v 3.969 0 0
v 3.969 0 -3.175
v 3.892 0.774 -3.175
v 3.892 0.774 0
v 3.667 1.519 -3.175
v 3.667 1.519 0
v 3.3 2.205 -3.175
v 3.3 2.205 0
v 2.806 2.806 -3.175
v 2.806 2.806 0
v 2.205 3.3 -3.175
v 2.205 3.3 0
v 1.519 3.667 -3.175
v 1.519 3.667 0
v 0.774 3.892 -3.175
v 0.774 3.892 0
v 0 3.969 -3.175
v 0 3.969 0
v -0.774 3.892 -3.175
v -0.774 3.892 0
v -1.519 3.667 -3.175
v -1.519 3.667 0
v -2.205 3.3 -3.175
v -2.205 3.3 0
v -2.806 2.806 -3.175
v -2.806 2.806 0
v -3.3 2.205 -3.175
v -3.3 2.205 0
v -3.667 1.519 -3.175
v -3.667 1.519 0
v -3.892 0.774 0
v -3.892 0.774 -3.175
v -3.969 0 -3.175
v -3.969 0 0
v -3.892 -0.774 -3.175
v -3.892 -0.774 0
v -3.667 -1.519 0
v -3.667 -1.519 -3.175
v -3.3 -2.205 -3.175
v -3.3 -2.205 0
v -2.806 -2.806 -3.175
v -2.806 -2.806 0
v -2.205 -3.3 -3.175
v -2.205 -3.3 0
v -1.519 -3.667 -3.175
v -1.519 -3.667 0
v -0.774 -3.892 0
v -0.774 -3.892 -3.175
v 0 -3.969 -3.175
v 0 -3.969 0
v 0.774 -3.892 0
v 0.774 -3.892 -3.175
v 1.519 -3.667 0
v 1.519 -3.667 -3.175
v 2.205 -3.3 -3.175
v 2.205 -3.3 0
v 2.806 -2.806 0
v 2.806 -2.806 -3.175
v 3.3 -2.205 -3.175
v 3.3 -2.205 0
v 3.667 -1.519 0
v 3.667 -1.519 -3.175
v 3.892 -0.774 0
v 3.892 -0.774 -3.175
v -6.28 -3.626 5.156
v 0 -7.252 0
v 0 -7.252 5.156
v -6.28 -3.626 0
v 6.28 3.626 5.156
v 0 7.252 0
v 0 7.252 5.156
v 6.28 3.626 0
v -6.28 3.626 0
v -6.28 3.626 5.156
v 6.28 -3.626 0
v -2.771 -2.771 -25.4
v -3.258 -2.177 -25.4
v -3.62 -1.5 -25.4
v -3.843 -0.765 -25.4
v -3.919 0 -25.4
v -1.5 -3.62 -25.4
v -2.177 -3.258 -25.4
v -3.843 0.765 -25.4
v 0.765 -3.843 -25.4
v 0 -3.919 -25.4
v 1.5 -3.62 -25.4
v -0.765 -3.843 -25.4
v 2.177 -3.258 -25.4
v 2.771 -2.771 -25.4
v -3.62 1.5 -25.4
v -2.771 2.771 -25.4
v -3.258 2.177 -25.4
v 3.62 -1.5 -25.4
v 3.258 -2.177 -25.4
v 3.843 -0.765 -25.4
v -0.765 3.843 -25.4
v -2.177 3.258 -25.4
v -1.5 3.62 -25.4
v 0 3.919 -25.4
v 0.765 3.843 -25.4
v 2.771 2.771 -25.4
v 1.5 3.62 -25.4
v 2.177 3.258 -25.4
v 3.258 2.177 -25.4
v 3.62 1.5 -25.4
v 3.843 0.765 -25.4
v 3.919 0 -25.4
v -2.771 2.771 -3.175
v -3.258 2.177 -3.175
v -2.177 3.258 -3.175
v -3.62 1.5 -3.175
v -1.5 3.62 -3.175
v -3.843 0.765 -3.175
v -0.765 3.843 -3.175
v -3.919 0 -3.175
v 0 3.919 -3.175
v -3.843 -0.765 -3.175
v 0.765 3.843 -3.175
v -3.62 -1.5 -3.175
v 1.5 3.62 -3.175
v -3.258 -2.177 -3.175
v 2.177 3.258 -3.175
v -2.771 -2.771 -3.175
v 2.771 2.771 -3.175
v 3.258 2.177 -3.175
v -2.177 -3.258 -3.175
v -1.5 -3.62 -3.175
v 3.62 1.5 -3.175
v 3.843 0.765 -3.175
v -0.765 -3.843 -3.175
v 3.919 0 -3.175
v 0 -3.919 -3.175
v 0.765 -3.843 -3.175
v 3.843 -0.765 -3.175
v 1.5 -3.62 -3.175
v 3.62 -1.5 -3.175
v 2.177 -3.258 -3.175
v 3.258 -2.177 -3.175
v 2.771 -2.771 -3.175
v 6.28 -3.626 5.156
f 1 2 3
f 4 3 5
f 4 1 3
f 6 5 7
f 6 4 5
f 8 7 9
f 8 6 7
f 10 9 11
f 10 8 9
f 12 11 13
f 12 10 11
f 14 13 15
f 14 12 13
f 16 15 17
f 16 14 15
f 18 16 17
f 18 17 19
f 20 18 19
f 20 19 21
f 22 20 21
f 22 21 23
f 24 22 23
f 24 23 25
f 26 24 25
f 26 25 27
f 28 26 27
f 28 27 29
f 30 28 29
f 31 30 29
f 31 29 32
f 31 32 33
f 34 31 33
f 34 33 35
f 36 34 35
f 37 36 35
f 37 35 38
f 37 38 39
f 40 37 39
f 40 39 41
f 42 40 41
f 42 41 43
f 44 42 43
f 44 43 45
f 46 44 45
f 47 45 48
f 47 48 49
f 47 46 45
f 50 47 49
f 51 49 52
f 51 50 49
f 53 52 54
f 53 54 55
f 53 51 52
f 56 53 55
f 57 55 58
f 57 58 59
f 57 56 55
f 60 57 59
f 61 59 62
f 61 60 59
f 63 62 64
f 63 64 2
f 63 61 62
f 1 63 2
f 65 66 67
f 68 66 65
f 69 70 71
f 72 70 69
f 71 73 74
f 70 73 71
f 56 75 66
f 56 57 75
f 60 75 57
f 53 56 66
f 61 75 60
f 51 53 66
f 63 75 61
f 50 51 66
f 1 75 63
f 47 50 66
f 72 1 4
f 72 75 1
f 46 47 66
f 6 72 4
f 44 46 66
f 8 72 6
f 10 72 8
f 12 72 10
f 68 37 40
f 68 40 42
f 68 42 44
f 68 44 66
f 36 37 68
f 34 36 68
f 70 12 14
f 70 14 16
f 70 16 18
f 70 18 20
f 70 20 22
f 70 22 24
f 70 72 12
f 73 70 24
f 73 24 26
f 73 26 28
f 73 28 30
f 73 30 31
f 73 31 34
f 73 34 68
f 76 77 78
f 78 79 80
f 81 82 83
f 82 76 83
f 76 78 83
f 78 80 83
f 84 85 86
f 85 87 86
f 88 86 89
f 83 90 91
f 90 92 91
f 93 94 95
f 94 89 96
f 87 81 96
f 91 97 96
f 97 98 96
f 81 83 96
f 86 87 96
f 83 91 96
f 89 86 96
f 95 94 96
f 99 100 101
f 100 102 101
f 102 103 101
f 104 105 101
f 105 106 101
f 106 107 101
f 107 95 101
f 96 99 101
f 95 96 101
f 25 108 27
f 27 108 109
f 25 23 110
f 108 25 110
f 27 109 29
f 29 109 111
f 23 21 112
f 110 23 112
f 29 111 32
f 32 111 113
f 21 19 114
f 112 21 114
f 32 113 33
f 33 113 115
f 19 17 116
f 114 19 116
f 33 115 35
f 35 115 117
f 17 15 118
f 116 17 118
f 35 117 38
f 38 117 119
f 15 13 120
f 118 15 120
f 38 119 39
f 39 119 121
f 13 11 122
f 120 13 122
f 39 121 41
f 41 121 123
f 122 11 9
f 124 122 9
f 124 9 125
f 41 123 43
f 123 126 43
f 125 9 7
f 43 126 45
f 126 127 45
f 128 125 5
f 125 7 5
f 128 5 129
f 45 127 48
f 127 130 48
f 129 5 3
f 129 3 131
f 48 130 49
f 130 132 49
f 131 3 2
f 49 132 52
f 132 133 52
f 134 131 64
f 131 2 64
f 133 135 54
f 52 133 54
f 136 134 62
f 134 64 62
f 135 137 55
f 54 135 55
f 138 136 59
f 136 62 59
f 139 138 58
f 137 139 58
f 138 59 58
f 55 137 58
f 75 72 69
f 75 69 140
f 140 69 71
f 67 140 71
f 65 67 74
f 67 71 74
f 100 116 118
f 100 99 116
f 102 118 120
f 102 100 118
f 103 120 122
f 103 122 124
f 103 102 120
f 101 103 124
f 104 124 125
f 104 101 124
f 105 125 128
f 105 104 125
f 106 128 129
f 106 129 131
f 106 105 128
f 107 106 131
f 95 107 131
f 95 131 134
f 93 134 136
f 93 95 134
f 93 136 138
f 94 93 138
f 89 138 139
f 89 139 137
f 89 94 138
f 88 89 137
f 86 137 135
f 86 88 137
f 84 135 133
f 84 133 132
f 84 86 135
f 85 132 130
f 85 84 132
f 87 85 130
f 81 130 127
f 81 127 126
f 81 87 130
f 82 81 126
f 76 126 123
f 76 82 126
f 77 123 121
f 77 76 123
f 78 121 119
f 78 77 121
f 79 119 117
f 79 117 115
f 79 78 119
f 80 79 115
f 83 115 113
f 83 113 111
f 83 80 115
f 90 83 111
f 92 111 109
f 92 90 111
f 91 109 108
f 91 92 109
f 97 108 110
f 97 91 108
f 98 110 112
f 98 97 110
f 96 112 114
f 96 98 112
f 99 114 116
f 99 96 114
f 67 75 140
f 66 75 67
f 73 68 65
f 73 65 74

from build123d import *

# Parameters (mm, degrees)
HEAD_DEPTH     = 5.1562
SHANK_SKETCH_R = 3.96875
SHANK_DEPTH    = 25.4
THREAD_END_W   = 22.225
THREAD_END_H   = 0.05


with BuildPart() as part:
    # Head Sketch → Head (new body)
    with BuildSketch(Plane.XY):
        Polygon((0, 7.251692586), (6.28015, 3.625846293), (6.28015, -3.625846293), (0, -7.251692586), (-6.28015, -3.625846293), (-6.28015, 3.625846293), align=None)
    extrude(amount=HEAD_DEPTH)

    # Shank Sketch → Shank (add)
    with BuildSketch(Plane.XY):
        Circle(SHANK_SKETCH_R)
    extrude(amount=-SHANK_DEPTH)

    # Thread End → Thread Cut (revolve, cut)
    with BuildSketch(Plane(origin=(0, 0, 0), x_dir=(0, 0, -1), z_dir=(1, 0, 0))):
        with Locations((14.2875, 3.94375)):
            Rectangle(THREAD_END_W, THREAD_END_H)
    revolve(axis=Axis((0, 0, -21.551935625), (0, 0, -1)), mode=Mode.SUBTRACT)


solid = part.part
